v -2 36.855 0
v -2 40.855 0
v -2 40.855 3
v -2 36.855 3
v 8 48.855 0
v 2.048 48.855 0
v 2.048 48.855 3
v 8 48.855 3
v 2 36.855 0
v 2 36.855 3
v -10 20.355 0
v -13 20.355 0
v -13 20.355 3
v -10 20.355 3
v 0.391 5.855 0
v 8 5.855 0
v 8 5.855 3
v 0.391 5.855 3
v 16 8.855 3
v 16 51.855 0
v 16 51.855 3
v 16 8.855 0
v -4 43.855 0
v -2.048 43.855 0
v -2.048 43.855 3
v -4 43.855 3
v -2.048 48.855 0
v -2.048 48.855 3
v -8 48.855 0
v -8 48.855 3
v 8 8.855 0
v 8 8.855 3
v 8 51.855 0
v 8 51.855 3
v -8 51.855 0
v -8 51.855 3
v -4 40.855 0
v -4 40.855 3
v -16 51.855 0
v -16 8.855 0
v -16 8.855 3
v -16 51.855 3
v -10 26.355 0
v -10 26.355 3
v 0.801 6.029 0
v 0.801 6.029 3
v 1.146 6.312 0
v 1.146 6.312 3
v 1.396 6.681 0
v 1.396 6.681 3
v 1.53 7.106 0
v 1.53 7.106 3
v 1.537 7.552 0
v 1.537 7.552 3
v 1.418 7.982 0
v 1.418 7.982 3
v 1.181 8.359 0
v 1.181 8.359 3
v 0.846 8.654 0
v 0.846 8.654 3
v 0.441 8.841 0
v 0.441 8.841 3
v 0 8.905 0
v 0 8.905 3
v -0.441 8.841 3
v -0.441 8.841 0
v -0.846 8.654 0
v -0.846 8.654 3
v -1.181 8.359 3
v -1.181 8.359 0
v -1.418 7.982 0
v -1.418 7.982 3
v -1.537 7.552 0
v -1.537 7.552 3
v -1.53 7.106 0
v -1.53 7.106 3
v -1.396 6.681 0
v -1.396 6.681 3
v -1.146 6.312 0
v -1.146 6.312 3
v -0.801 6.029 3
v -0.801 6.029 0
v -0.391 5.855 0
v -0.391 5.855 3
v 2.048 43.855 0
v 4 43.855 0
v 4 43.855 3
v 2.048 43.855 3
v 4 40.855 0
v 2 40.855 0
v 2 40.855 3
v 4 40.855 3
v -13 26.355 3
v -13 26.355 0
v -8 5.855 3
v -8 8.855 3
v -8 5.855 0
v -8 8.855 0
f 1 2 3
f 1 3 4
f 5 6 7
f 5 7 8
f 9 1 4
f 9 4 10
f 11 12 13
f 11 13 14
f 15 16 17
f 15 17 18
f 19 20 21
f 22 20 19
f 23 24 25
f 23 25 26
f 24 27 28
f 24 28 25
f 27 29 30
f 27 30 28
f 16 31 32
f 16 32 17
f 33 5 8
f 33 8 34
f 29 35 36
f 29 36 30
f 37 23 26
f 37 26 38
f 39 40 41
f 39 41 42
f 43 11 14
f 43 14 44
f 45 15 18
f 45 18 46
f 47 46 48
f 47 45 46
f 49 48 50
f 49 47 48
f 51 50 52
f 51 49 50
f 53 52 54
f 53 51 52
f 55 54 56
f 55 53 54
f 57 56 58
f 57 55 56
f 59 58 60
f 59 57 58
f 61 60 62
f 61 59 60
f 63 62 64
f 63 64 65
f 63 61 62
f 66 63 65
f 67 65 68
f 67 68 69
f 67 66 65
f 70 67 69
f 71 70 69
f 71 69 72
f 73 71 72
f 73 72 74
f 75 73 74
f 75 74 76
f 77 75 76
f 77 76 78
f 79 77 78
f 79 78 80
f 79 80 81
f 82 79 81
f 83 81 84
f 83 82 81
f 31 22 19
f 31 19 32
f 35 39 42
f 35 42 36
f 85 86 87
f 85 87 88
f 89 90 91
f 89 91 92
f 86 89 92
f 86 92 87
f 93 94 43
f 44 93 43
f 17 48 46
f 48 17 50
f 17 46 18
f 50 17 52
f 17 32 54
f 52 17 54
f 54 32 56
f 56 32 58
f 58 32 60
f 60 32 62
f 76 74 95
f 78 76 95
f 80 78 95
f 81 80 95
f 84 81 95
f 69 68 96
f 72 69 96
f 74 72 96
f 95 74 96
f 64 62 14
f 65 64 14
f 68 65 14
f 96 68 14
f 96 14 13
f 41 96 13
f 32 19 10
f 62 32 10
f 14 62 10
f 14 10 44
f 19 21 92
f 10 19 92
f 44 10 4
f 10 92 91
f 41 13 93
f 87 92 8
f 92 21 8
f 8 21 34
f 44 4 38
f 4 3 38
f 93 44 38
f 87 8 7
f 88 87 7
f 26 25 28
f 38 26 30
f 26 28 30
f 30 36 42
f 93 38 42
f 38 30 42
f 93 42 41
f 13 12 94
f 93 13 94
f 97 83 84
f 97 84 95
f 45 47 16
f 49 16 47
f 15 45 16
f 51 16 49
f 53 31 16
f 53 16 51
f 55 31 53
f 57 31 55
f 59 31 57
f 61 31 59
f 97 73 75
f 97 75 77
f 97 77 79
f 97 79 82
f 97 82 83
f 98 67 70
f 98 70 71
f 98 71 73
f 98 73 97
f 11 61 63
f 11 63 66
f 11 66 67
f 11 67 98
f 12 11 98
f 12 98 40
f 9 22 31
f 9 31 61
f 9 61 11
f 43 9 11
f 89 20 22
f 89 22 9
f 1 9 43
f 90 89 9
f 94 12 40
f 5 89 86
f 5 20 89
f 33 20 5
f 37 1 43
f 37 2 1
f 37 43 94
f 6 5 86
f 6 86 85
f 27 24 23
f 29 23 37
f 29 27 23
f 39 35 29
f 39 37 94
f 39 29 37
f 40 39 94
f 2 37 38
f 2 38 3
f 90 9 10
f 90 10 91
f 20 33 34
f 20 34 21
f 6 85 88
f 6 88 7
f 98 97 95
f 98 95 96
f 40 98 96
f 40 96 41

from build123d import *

# Parameters (mm, degrees)
SKETCH_2_W      = 3
SKETCH_2_H      = 6
EXTRUDE_1_DEPTH = 3


with BuildPart() as part:
    # 草图2 → 凸台-拉伸1 (new body)
    with BuildSketch(Plane.XY):
        with BuildLine():
            Line((2.047890023, 48.855305477), (8, 48.855305477))
            Line((8, 48.855305477), (8, 51.855305477))
            Line((8, 51.855305477), (16, 51.855305477))
            Line((16, 51.855305477), (16, 8.855305477))
            Line((16, 8.855305477), (8, 8.855305477))
            Line((8, 8.855305477), (8, 5.855305477))
            Line((8, 5.855305477), (0.390512484, 5.855305477))
            ThreePointArc((0.390512484, 5.855305477), (0, 8.905305477), (-0.390512484, 5.855305477))
            Line((-0.390512484, 5.855305477), (-8, 5.855305477))
            Line((-8, 5.855305477), (-8, 8.855305477))
            Line((-8, 8.855305477), (-16, 8.855305477))
            Line((-16, 8.855305477), (-16, 51.855305477))
            Line((-16, 51.855305477), (-8, 51.855305477))
            Line((-8, 51.855305477), (-8, 48.855305477))
            Line((-8, 48.855305477), (-2.047890023, 48.855305477))
            Line((-2.047890023, 48.855305477), (-2.047890023, 43.855305477))
            Line((-2.047890023, 43.855305477), (-4, 43.855305477))
            Line((-4, 43.855305477), (-4, 40.855305477))
            Line((-4, 40.855305477), (-2, 40.855305477))
            Line((-2, 40.855305477), (-2, 36.855305477))
            Line((-2, 36.855305477), (2, 36.855305477))
            Line((2, 36.855305477), (2, 40.855305477))
            Line((2, 40.855305477), (4, 40.855305477))
            Line((4, 40.855305477), (4, 43.855305477))
            Line((4, 43.855305477), (2.047890023, 43.855305477))
            Line((2.047890023, 43.855305477), (2.047890023, 48.855305477))
        make_face()
        with Locations((-11.5, 23.355305477)):
            Rectangle(SKETCH_2_W, SKETCH_2_H, mode=Mode.SUBTRACT)
    extrude(amount=EXTRUDE_1_DEPTH)


solid = part.part
